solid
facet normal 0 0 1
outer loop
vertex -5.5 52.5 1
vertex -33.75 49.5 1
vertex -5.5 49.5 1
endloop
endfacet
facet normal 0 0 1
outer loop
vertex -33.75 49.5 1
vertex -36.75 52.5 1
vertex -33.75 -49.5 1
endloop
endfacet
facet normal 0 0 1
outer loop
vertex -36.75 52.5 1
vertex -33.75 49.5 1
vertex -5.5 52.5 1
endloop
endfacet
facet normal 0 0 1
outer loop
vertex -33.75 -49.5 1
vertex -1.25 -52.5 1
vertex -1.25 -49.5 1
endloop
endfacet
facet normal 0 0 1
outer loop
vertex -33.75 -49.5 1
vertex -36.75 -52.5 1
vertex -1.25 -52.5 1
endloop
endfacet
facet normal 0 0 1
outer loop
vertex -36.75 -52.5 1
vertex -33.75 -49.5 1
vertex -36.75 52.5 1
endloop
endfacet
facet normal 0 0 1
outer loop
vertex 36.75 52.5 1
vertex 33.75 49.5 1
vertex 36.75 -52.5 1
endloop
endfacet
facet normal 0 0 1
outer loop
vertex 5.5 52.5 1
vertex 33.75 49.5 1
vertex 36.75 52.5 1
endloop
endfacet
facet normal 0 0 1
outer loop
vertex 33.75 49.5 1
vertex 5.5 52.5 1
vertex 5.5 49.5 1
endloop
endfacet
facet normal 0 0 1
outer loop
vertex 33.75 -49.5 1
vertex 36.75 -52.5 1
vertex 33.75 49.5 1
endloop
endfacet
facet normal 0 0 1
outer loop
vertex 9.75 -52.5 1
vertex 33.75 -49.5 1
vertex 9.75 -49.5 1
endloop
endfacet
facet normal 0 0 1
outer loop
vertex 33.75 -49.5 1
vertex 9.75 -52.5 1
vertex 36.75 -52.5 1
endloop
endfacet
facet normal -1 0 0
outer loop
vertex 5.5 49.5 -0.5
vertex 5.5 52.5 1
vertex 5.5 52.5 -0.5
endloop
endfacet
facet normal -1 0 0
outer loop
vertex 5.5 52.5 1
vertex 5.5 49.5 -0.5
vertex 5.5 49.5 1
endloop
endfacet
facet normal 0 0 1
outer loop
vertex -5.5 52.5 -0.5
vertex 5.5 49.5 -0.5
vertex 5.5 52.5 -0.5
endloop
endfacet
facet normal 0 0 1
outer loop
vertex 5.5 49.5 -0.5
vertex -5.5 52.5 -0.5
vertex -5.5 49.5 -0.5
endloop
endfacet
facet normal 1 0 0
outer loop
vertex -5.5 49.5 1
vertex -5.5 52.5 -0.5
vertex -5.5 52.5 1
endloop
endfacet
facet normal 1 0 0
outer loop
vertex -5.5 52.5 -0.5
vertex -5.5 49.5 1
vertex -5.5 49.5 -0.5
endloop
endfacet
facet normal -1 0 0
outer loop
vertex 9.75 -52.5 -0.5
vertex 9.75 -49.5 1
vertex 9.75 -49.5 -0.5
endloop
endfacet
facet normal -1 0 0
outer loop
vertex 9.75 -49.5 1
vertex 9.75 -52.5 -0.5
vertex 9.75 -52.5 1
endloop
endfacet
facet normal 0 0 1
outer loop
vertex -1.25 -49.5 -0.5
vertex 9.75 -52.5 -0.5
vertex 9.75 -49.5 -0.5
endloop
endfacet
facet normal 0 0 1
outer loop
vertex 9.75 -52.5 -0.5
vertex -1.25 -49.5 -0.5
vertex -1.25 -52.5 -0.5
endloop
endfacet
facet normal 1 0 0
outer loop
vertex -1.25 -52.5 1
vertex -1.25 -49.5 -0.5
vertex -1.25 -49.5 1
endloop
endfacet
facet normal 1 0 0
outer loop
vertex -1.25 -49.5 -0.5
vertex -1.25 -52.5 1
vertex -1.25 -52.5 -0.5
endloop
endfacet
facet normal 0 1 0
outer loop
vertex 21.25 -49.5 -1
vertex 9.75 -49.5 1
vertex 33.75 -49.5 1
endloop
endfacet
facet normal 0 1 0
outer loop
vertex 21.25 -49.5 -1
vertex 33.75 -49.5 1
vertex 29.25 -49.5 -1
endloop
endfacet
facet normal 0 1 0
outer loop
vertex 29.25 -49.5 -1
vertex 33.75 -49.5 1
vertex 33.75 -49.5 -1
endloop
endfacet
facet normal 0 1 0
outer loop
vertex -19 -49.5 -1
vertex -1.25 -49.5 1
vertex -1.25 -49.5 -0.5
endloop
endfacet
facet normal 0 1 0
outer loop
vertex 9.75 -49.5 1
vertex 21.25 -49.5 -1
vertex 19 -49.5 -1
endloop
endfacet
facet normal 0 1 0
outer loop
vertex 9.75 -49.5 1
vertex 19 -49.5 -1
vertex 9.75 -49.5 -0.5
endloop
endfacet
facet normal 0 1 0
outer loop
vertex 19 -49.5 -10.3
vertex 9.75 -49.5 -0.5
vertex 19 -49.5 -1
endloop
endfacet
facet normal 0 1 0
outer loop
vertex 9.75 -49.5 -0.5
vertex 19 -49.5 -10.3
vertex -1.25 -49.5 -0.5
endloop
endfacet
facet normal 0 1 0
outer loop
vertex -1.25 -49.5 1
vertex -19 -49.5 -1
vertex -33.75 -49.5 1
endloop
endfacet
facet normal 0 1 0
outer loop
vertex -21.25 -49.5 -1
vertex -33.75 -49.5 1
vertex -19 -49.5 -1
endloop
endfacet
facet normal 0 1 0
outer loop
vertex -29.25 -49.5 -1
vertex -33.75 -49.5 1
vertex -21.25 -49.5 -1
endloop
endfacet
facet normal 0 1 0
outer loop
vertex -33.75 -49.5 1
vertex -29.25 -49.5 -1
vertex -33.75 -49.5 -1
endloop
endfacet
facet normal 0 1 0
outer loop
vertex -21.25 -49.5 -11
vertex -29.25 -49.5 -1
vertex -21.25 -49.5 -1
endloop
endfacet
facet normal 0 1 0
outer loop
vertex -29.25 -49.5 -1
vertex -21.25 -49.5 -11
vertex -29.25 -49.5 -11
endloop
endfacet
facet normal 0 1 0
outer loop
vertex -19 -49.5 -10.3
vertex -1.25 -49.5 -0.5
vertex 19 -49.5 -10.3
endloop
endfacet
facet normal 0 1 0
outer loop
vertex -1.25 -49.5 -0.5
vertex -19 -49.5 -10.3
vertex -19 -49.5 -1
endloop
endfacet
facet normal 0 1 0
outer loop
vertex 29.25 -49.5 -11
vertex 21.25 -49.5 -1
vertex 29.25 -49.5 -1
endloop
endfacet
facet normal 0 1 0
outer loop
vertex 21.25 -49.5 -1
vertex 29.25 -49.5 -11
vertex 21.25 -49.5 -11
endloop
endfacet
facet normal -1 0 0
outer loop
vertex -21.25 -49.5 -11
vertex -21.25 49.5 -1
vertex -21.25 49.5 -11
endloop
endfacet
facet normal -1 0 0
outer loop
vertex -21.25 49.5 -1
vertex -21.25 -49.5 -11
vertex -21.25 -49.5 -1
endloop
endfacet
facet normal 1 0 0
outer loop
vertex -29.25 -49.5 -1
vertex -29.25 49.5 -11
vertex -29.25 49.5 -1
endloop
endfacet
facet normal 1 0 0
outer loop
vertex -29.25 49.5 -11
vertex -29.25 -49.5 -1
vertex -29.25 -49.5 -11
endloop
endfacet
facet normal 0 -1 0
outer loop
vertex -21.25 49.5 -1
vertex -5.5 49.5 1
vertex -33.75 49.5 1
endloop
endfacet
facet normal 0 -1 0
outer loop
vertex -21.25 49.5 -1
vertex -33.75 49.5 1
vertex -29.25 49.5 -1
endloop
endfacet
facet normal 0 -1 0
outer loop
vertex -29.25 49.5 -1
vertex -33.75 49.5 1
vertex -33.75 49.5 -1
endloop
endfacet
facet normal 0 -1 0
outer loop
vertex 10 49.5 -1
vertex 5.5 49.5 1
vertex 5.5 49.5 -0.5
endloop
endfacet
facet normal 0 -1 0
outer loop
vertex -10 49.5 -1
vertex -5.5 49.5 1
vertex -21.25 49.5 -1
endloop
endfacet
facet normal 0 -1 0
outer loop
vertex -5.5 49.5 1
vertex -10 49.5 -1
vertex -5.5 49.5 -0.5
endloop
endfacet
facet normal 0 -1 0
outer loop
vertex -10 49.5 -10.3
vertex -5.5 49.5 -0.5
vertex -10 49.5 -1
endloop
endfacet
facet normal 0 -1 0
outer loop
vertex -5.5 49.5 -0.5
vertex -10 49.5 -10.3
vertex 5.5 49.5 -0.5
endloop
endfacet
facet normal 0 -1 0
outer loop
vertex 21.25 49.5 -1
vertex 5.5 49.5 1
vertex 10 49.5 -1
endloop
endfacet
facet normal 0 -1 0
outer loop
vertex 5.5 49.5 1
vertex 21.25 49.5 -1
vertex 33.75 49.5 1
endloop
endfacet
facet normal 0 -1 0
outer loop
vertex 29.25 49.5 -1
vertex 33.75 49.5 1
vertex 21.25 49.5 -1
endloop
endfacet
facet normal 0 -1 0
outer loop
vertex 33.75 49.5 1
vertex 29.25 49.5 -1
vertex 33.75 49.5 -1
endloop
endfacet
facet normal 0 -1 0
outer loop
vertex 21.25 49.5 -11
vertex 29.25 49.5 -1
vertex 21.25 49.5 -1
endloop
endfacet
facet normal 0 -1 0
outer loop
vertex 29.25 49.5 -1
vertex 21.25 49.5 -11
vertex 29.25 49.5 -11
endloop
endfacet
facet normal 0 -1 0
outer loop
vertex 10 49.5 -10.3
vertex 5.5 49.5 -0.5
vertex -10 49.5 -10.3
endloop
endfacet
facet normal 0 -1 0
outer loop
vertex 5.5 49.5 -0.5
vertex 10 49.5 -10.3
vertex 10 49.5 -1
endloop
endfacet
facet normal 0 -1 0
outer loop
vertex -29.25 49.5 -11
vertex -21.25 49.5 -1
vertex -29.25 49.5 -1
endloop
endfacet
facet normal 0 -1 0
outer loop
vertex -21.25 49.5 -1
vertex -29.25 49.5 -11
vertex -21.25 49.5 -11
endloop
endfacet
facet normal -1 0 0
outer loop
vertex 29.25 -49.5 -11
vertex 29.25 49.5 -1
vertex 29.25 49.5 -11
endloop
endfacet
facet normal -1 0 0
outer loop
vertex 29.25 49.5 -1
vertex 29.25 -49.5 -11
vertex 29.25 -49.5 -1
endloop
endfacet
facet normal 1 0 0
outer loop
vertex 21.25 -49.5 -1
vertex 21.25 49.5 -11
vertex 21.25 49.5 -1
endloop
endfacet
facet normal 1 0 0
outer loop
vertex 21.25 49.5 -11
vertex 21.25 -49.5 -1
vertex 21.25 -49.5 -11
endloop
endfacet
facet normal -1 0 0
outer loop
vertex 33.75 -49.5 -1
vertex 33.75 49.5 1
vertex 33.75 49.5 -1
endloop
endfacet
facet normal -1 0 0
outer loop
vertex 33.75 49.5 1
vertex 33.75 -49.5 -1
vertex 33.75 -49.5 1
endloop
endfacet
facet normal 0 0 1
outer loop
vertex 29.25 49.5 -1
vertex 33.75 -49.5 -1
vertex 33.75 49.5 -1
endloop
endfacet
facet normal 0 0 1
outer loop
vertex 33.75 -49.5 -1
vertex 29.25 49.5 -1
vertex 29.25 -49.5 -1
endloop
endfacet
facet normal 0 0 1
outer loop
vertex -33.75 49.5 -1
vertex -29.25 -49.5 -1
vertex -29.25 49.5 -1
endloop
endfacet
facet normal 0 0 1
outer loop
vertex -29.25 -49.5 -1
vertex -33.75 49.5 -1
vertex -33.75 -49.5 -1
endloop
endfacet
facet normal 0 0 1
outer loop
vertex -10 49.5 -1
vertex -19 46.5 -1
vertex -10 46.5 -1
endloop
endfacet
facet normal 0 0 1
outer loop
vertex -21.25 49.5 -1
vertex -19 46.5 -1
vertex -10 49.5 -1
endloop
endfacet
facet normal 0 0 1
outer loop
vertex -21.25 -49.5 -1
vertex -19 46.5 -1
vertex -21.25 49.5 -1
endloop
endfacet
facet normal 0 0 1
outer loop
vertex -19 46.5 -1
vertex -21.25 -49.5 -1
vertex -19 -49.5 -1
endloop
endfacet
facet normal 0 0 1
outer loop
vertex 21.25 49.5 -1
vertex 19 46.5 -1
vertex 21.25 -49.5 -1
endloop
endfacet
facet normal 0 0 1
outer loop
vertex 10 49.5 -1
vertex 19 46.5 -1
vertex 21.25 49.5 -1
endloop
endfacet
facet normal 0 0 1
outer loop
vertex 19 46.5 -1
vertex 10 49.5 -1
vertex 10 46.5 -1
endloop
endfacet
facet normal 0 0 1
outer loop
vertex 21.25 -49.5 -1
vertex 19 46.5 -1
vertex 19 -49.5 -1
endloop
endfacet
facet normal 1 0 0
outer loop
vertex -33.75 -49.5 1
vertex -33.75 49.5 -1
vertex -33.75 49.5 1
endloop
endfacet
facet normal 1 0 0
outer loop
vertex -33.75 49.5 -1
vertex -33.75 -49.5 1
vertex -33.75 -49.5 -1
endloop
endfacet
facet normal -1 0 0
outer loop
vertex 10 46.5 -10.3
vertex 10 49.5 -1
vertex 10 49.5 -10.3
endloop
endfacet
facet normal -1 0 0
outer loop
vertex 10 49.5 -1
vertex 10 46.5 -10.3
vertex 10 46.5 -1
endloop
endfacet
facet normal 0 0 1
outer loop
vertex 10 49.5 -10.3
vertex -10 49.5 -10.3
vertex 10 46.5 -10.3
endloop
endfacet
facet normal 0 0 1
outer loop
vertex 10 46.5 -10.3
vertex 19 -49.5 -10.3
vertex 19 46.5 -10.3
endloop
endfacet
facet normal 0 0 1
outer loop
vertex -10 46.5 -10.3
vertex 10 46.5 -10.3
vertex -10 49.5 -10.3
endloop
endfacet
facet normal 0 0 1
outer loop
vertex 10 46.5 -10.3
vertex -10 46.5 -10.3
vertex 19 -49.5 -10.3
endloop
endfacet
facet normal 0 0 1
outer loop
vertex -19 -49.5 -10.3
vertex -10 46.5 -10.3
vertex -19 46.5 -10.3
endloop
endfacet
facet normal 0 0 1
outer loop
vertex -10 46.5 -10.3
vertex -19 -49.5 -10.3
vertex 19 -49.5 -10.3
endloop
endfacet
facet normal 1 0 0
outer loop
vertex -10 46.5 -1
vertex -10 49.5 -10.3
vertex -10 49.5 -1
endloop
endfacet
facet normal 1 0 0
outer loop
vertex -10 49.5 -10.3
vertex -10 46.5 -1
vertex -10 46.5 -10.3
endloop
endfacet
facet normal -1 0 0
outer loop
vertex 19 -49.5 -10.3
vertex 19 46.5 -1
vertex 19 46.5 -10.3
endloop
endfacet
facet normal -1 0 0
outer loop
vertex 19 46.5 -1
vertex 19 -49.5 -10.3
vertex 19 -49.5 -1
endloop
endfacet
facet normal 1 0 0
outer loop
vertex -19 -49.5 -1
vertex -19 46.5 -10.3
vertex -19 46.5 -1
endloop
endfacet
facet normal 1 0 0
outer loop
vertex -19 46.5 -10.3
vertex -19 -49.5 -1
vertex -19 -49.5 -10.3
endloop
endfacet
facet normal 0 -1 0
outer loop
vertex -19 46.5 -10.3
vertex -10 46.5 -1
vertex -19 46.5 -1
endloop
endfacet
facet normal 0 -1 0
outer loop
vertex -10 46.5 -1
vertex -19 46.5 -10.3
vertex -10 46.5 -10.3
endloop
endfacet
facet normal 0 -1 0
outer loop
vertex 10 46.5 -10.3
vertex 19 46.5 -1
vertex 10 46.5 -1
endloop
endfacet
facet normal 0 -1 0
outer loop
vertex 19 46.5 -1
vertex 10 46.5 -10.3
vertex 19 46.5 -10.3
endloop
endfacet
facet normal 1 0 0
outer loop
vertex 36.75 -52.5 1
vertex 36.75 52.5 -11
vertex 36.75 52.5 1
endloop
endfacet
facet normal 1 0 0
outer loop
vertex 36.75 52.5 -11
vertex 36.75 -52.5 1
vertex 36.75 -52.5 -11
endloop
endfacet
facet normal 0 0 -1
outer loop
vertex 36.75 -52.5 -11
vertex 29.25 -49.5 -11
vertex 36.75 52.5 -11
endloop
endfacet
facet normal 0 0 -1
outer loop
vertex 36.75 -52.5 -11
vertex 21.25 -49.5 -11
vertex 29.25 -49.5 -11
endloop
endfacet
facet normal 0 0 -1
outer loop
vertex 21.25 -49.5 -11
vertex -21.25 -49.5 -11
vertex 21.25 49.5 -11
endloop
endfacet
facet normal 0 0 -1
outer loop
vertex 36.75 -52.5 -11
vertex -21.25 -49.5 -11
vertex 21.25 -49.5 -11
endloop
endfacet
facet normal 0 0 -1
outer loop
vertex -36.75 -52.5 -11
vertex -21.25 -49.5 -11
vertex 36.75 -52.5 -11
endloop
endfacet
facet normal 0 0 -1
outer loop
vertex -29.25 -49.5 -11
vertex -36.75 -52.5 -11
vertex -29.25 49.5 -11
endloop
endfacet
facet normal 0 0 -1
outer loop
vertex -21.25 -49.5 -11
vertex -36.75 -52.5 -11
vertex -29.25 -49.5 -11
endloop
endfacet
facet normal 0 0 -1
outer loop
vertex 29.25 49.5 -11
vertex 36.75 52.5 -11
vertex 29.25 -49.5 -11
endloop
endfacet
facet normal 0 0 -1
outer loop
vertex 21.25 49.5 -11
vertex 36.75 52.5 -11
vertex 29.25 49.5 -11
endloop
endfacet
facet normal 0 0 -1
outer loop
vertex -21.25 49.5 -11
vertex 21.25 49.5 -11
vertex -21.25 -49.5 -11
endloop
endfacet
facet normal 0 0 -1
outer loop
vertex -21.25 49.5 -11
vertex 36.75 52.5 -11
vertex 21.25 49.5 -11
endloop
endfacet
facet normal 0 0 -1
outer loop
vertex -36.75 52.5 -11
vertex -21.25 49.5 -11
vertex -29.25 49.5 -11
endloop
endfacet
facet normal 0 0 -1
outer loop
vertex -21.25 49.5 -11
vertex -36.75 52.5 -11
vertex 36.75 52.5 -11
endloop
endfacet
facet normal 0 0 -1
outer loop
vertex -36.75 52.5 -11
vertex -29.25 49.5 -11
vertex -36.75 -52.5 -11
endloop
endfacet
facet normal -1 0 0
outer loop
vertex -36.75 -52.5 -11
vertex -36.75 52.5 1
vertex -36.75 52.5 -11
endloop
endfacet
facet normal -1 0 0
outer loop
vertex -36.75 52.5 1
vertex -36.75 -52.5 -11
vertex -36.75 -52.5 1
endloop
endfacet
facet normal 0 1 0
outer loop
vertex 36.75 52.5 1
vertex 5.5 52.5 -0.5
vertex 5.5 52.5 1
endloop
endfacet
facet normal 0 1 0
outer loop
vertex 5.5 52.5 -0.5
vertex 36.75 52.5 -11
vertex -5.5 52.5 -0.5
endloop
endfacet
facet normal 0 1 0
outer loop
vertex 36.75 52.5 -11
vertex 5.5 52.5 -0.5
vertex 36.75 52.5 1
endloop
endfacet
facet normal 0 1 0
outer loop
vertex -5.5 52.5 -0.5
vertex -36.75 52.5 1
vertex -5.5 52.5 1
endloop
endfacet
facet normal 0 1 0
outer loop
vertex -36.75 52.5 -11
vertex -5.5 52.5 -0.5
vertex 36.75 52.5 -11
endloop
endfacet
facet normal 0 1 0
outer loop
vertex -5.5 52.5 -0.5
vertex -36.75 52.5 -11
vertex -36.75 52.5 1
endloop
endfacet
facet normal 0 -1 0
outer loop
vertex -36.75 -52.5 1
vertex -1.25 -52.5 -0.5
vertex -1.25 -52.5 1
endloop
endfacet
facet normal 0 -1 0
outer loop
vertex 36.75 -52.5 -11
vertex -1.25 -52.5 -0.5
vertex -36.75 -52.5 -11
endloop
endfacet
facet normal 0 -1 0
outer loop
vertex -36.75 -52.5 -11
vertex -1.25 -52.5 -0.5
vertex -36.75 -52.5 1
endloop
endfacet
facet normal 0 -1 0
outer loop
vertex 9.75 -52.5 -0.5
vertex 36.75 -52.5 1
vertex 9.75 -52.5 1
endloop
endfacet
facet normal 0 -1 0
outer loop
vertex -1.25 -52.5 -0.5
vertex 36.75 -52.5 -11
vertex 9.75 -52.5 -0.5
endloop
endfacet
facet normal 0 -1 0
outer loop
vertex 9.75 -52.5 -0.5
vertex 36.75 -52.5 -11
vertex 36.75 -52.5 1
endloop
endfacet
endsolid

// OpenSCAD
pcb_width = 67.5;
pcb_length = 99;
pcb_height = 2.0;

header_width = 8.0;
header_length = pcb_length;
header_height = 25.0;
header_mount = 2.0;
header_horiz = 50.5;

button_side = 6;
button_base = 4;
button_height = 12;
button_bottom_space = 28;
button_horiz = 18;

mini_usb_width = 8;
mini_usb_height = 4;
mini_usb_depth = 8;

micro_usb_width = 8;
micro_usb_height = 4;
micro_usb_depth = 5;
micro_usb_right = 29.5;

usb_spacing = 3.0;

headphone_width = 8;
headphone_height = 13;
headphone_depth = 15;
headphone_left = 15;
headphone_jack_side = 8;
headphone_jack_out = 10;

usb_room = 10;

header = [header_width, header_length, header_height];
pcb = [pcb_width, pcb_length, pcb_height];

module header() {
	translate([0,0,-header_mount]) cube(header, center=true);
}
module pcb() {
	cube(pcb, center=true);
}
module button() {
	union() {
		translate([0,0,button_base/2]) cube([button_side, button_side, button_base], center=true);
		cylinder(r=button_side/2, h=button_height);
	}
}
module miniusb() {
	translate([-mini_usb_width/2,-mini_usb_depth/2,0]) union() {
		cube([mini_usb_width, mini_usb_depth, mini_usb_height]);
		translate([-usb_spacing/2,mini_usb_depth-0.1,-usb_spacing/2]) 
		cube([mini_usb_width + usb_spacing, usb_room, mini_usb_height + usb_spacing]);
	}
}
module microusb() {
	translate([-micro_usb_width/2,0,0]) union() {
		cube([micro_usb_width, micro_usb_depth, micro_usb_height]);
		translate([-usb_spacing/2,-usb_room+0.1,-usb_spacing/2]) 
		cube([micro_usb_width + usb_spacing, usb_room, micro_usb_height + usb_spacing]);
	}
}
module headphone() {
	union() {
		cube([headphone_width, headphone_depth, headphone_height]);
		translate([headphone_jack_side/2,0,headphone_height/2]) {
			rotate([90,0,0]) translate([0,headphone_jack_side/4,-0.1]){
				cylinder(r=headphone_jack_side/2,h=headphone_jack_out);
				translate([-headphone_jack_side/2,-headphone_jack_side/2,0])
				cube([headphone_jack_side, headphone_jack_side/2, headphone_jack_out]);
				translate([0,-headphone_jack_side/2,0])
				cylinder(r=headphone_jack_side/2,h=headphone_jack_out);
			}
		}
	}
}

module board() {
	union() {
		translate([-header_horiz/2,0,0]) header();
		translate([header_horiz/2,0,0]) header();
		translate([0,-pcb_length/2 + button_bottom_space,0]) {
			translate([-button_horiz/2,0,0]) button();
			translate([button_horiz/2,0,0]) button();
		}
		translate([0,pcb_length/2 - mini_usb_depth, pcb_height/2]) miniusb();
		translate([pcb_width/2-micro_usb_right,-pcb_length/2, pcb_height/2]) microusb();
		translate([-pcb_width/2 + headphone_left,-pcb_length/2,pcb_height/2]) headphone();
		pcb();
	}
}

//MAIN
bottom_h = 12;
ltol = 6;
wtol = 6;
lt = 0;
wt = 0;
deep = 1;
bw=pcb[0]+wtol;
bl=pcb[1]+ltol;
bwi=pcb[0]+lt;
bli=pcb[1]+wt;
module bottom() {
	difference() {
		translate([0,0,deep-bottom_h/2]) cube([bw, bl, bottom_h], center=true);
		board();
		translate([-bwi/2,-bli/2,0]) cube([bwi, bli, 50]);
		translate([0,0,deep-bottom_h/2+0.7]) {
			cube([20,pcb[1],bottom_h], center=true);
			translate([0,-ltol/4,0])
			cube([38,pcb[1]-ltol/2,bottom_h], center=true);
		}
	}
}

tltol = 9.5;
twtol = 9.5;
tw = pcb[0]+twtol;
tl = pcb[1]+tltol;
top_h = 15;
th = top_h + bottom_h - deep;
bdeep = 0;
ttol = 0.7;
tgap = 5;
module top() {
	difference() {
		translate([-tw/2,-tl/2,deep-bottom_h]) cube([tw, tl, th]);
		board();
		translate([0,0,top_h/2+bdeep]) {
			cube([20,pcb[1],top_h+2], center=true);
			cube([39,pcb[1],top_h+2], center=true);
		}
		translate([0,0,-bottom_h/2+deep-20/2])
		cube([bw+ttol,bl+ttol,bottom_h+20.1],center=true);
		translate([(header_horiz+header_width+tgap-0.1)/2,0,top_h/2])
		cube([tgap,pcb[1],top_h-2], center=true);
		translate([-(header_horiz+header_width+tgap-0.1)/2,0,top_h/2])
		cube([tgap,pcb[1],top_h-2], center=true);
	}
}

//board();
difference() {
	//top();
	bottom();
}
